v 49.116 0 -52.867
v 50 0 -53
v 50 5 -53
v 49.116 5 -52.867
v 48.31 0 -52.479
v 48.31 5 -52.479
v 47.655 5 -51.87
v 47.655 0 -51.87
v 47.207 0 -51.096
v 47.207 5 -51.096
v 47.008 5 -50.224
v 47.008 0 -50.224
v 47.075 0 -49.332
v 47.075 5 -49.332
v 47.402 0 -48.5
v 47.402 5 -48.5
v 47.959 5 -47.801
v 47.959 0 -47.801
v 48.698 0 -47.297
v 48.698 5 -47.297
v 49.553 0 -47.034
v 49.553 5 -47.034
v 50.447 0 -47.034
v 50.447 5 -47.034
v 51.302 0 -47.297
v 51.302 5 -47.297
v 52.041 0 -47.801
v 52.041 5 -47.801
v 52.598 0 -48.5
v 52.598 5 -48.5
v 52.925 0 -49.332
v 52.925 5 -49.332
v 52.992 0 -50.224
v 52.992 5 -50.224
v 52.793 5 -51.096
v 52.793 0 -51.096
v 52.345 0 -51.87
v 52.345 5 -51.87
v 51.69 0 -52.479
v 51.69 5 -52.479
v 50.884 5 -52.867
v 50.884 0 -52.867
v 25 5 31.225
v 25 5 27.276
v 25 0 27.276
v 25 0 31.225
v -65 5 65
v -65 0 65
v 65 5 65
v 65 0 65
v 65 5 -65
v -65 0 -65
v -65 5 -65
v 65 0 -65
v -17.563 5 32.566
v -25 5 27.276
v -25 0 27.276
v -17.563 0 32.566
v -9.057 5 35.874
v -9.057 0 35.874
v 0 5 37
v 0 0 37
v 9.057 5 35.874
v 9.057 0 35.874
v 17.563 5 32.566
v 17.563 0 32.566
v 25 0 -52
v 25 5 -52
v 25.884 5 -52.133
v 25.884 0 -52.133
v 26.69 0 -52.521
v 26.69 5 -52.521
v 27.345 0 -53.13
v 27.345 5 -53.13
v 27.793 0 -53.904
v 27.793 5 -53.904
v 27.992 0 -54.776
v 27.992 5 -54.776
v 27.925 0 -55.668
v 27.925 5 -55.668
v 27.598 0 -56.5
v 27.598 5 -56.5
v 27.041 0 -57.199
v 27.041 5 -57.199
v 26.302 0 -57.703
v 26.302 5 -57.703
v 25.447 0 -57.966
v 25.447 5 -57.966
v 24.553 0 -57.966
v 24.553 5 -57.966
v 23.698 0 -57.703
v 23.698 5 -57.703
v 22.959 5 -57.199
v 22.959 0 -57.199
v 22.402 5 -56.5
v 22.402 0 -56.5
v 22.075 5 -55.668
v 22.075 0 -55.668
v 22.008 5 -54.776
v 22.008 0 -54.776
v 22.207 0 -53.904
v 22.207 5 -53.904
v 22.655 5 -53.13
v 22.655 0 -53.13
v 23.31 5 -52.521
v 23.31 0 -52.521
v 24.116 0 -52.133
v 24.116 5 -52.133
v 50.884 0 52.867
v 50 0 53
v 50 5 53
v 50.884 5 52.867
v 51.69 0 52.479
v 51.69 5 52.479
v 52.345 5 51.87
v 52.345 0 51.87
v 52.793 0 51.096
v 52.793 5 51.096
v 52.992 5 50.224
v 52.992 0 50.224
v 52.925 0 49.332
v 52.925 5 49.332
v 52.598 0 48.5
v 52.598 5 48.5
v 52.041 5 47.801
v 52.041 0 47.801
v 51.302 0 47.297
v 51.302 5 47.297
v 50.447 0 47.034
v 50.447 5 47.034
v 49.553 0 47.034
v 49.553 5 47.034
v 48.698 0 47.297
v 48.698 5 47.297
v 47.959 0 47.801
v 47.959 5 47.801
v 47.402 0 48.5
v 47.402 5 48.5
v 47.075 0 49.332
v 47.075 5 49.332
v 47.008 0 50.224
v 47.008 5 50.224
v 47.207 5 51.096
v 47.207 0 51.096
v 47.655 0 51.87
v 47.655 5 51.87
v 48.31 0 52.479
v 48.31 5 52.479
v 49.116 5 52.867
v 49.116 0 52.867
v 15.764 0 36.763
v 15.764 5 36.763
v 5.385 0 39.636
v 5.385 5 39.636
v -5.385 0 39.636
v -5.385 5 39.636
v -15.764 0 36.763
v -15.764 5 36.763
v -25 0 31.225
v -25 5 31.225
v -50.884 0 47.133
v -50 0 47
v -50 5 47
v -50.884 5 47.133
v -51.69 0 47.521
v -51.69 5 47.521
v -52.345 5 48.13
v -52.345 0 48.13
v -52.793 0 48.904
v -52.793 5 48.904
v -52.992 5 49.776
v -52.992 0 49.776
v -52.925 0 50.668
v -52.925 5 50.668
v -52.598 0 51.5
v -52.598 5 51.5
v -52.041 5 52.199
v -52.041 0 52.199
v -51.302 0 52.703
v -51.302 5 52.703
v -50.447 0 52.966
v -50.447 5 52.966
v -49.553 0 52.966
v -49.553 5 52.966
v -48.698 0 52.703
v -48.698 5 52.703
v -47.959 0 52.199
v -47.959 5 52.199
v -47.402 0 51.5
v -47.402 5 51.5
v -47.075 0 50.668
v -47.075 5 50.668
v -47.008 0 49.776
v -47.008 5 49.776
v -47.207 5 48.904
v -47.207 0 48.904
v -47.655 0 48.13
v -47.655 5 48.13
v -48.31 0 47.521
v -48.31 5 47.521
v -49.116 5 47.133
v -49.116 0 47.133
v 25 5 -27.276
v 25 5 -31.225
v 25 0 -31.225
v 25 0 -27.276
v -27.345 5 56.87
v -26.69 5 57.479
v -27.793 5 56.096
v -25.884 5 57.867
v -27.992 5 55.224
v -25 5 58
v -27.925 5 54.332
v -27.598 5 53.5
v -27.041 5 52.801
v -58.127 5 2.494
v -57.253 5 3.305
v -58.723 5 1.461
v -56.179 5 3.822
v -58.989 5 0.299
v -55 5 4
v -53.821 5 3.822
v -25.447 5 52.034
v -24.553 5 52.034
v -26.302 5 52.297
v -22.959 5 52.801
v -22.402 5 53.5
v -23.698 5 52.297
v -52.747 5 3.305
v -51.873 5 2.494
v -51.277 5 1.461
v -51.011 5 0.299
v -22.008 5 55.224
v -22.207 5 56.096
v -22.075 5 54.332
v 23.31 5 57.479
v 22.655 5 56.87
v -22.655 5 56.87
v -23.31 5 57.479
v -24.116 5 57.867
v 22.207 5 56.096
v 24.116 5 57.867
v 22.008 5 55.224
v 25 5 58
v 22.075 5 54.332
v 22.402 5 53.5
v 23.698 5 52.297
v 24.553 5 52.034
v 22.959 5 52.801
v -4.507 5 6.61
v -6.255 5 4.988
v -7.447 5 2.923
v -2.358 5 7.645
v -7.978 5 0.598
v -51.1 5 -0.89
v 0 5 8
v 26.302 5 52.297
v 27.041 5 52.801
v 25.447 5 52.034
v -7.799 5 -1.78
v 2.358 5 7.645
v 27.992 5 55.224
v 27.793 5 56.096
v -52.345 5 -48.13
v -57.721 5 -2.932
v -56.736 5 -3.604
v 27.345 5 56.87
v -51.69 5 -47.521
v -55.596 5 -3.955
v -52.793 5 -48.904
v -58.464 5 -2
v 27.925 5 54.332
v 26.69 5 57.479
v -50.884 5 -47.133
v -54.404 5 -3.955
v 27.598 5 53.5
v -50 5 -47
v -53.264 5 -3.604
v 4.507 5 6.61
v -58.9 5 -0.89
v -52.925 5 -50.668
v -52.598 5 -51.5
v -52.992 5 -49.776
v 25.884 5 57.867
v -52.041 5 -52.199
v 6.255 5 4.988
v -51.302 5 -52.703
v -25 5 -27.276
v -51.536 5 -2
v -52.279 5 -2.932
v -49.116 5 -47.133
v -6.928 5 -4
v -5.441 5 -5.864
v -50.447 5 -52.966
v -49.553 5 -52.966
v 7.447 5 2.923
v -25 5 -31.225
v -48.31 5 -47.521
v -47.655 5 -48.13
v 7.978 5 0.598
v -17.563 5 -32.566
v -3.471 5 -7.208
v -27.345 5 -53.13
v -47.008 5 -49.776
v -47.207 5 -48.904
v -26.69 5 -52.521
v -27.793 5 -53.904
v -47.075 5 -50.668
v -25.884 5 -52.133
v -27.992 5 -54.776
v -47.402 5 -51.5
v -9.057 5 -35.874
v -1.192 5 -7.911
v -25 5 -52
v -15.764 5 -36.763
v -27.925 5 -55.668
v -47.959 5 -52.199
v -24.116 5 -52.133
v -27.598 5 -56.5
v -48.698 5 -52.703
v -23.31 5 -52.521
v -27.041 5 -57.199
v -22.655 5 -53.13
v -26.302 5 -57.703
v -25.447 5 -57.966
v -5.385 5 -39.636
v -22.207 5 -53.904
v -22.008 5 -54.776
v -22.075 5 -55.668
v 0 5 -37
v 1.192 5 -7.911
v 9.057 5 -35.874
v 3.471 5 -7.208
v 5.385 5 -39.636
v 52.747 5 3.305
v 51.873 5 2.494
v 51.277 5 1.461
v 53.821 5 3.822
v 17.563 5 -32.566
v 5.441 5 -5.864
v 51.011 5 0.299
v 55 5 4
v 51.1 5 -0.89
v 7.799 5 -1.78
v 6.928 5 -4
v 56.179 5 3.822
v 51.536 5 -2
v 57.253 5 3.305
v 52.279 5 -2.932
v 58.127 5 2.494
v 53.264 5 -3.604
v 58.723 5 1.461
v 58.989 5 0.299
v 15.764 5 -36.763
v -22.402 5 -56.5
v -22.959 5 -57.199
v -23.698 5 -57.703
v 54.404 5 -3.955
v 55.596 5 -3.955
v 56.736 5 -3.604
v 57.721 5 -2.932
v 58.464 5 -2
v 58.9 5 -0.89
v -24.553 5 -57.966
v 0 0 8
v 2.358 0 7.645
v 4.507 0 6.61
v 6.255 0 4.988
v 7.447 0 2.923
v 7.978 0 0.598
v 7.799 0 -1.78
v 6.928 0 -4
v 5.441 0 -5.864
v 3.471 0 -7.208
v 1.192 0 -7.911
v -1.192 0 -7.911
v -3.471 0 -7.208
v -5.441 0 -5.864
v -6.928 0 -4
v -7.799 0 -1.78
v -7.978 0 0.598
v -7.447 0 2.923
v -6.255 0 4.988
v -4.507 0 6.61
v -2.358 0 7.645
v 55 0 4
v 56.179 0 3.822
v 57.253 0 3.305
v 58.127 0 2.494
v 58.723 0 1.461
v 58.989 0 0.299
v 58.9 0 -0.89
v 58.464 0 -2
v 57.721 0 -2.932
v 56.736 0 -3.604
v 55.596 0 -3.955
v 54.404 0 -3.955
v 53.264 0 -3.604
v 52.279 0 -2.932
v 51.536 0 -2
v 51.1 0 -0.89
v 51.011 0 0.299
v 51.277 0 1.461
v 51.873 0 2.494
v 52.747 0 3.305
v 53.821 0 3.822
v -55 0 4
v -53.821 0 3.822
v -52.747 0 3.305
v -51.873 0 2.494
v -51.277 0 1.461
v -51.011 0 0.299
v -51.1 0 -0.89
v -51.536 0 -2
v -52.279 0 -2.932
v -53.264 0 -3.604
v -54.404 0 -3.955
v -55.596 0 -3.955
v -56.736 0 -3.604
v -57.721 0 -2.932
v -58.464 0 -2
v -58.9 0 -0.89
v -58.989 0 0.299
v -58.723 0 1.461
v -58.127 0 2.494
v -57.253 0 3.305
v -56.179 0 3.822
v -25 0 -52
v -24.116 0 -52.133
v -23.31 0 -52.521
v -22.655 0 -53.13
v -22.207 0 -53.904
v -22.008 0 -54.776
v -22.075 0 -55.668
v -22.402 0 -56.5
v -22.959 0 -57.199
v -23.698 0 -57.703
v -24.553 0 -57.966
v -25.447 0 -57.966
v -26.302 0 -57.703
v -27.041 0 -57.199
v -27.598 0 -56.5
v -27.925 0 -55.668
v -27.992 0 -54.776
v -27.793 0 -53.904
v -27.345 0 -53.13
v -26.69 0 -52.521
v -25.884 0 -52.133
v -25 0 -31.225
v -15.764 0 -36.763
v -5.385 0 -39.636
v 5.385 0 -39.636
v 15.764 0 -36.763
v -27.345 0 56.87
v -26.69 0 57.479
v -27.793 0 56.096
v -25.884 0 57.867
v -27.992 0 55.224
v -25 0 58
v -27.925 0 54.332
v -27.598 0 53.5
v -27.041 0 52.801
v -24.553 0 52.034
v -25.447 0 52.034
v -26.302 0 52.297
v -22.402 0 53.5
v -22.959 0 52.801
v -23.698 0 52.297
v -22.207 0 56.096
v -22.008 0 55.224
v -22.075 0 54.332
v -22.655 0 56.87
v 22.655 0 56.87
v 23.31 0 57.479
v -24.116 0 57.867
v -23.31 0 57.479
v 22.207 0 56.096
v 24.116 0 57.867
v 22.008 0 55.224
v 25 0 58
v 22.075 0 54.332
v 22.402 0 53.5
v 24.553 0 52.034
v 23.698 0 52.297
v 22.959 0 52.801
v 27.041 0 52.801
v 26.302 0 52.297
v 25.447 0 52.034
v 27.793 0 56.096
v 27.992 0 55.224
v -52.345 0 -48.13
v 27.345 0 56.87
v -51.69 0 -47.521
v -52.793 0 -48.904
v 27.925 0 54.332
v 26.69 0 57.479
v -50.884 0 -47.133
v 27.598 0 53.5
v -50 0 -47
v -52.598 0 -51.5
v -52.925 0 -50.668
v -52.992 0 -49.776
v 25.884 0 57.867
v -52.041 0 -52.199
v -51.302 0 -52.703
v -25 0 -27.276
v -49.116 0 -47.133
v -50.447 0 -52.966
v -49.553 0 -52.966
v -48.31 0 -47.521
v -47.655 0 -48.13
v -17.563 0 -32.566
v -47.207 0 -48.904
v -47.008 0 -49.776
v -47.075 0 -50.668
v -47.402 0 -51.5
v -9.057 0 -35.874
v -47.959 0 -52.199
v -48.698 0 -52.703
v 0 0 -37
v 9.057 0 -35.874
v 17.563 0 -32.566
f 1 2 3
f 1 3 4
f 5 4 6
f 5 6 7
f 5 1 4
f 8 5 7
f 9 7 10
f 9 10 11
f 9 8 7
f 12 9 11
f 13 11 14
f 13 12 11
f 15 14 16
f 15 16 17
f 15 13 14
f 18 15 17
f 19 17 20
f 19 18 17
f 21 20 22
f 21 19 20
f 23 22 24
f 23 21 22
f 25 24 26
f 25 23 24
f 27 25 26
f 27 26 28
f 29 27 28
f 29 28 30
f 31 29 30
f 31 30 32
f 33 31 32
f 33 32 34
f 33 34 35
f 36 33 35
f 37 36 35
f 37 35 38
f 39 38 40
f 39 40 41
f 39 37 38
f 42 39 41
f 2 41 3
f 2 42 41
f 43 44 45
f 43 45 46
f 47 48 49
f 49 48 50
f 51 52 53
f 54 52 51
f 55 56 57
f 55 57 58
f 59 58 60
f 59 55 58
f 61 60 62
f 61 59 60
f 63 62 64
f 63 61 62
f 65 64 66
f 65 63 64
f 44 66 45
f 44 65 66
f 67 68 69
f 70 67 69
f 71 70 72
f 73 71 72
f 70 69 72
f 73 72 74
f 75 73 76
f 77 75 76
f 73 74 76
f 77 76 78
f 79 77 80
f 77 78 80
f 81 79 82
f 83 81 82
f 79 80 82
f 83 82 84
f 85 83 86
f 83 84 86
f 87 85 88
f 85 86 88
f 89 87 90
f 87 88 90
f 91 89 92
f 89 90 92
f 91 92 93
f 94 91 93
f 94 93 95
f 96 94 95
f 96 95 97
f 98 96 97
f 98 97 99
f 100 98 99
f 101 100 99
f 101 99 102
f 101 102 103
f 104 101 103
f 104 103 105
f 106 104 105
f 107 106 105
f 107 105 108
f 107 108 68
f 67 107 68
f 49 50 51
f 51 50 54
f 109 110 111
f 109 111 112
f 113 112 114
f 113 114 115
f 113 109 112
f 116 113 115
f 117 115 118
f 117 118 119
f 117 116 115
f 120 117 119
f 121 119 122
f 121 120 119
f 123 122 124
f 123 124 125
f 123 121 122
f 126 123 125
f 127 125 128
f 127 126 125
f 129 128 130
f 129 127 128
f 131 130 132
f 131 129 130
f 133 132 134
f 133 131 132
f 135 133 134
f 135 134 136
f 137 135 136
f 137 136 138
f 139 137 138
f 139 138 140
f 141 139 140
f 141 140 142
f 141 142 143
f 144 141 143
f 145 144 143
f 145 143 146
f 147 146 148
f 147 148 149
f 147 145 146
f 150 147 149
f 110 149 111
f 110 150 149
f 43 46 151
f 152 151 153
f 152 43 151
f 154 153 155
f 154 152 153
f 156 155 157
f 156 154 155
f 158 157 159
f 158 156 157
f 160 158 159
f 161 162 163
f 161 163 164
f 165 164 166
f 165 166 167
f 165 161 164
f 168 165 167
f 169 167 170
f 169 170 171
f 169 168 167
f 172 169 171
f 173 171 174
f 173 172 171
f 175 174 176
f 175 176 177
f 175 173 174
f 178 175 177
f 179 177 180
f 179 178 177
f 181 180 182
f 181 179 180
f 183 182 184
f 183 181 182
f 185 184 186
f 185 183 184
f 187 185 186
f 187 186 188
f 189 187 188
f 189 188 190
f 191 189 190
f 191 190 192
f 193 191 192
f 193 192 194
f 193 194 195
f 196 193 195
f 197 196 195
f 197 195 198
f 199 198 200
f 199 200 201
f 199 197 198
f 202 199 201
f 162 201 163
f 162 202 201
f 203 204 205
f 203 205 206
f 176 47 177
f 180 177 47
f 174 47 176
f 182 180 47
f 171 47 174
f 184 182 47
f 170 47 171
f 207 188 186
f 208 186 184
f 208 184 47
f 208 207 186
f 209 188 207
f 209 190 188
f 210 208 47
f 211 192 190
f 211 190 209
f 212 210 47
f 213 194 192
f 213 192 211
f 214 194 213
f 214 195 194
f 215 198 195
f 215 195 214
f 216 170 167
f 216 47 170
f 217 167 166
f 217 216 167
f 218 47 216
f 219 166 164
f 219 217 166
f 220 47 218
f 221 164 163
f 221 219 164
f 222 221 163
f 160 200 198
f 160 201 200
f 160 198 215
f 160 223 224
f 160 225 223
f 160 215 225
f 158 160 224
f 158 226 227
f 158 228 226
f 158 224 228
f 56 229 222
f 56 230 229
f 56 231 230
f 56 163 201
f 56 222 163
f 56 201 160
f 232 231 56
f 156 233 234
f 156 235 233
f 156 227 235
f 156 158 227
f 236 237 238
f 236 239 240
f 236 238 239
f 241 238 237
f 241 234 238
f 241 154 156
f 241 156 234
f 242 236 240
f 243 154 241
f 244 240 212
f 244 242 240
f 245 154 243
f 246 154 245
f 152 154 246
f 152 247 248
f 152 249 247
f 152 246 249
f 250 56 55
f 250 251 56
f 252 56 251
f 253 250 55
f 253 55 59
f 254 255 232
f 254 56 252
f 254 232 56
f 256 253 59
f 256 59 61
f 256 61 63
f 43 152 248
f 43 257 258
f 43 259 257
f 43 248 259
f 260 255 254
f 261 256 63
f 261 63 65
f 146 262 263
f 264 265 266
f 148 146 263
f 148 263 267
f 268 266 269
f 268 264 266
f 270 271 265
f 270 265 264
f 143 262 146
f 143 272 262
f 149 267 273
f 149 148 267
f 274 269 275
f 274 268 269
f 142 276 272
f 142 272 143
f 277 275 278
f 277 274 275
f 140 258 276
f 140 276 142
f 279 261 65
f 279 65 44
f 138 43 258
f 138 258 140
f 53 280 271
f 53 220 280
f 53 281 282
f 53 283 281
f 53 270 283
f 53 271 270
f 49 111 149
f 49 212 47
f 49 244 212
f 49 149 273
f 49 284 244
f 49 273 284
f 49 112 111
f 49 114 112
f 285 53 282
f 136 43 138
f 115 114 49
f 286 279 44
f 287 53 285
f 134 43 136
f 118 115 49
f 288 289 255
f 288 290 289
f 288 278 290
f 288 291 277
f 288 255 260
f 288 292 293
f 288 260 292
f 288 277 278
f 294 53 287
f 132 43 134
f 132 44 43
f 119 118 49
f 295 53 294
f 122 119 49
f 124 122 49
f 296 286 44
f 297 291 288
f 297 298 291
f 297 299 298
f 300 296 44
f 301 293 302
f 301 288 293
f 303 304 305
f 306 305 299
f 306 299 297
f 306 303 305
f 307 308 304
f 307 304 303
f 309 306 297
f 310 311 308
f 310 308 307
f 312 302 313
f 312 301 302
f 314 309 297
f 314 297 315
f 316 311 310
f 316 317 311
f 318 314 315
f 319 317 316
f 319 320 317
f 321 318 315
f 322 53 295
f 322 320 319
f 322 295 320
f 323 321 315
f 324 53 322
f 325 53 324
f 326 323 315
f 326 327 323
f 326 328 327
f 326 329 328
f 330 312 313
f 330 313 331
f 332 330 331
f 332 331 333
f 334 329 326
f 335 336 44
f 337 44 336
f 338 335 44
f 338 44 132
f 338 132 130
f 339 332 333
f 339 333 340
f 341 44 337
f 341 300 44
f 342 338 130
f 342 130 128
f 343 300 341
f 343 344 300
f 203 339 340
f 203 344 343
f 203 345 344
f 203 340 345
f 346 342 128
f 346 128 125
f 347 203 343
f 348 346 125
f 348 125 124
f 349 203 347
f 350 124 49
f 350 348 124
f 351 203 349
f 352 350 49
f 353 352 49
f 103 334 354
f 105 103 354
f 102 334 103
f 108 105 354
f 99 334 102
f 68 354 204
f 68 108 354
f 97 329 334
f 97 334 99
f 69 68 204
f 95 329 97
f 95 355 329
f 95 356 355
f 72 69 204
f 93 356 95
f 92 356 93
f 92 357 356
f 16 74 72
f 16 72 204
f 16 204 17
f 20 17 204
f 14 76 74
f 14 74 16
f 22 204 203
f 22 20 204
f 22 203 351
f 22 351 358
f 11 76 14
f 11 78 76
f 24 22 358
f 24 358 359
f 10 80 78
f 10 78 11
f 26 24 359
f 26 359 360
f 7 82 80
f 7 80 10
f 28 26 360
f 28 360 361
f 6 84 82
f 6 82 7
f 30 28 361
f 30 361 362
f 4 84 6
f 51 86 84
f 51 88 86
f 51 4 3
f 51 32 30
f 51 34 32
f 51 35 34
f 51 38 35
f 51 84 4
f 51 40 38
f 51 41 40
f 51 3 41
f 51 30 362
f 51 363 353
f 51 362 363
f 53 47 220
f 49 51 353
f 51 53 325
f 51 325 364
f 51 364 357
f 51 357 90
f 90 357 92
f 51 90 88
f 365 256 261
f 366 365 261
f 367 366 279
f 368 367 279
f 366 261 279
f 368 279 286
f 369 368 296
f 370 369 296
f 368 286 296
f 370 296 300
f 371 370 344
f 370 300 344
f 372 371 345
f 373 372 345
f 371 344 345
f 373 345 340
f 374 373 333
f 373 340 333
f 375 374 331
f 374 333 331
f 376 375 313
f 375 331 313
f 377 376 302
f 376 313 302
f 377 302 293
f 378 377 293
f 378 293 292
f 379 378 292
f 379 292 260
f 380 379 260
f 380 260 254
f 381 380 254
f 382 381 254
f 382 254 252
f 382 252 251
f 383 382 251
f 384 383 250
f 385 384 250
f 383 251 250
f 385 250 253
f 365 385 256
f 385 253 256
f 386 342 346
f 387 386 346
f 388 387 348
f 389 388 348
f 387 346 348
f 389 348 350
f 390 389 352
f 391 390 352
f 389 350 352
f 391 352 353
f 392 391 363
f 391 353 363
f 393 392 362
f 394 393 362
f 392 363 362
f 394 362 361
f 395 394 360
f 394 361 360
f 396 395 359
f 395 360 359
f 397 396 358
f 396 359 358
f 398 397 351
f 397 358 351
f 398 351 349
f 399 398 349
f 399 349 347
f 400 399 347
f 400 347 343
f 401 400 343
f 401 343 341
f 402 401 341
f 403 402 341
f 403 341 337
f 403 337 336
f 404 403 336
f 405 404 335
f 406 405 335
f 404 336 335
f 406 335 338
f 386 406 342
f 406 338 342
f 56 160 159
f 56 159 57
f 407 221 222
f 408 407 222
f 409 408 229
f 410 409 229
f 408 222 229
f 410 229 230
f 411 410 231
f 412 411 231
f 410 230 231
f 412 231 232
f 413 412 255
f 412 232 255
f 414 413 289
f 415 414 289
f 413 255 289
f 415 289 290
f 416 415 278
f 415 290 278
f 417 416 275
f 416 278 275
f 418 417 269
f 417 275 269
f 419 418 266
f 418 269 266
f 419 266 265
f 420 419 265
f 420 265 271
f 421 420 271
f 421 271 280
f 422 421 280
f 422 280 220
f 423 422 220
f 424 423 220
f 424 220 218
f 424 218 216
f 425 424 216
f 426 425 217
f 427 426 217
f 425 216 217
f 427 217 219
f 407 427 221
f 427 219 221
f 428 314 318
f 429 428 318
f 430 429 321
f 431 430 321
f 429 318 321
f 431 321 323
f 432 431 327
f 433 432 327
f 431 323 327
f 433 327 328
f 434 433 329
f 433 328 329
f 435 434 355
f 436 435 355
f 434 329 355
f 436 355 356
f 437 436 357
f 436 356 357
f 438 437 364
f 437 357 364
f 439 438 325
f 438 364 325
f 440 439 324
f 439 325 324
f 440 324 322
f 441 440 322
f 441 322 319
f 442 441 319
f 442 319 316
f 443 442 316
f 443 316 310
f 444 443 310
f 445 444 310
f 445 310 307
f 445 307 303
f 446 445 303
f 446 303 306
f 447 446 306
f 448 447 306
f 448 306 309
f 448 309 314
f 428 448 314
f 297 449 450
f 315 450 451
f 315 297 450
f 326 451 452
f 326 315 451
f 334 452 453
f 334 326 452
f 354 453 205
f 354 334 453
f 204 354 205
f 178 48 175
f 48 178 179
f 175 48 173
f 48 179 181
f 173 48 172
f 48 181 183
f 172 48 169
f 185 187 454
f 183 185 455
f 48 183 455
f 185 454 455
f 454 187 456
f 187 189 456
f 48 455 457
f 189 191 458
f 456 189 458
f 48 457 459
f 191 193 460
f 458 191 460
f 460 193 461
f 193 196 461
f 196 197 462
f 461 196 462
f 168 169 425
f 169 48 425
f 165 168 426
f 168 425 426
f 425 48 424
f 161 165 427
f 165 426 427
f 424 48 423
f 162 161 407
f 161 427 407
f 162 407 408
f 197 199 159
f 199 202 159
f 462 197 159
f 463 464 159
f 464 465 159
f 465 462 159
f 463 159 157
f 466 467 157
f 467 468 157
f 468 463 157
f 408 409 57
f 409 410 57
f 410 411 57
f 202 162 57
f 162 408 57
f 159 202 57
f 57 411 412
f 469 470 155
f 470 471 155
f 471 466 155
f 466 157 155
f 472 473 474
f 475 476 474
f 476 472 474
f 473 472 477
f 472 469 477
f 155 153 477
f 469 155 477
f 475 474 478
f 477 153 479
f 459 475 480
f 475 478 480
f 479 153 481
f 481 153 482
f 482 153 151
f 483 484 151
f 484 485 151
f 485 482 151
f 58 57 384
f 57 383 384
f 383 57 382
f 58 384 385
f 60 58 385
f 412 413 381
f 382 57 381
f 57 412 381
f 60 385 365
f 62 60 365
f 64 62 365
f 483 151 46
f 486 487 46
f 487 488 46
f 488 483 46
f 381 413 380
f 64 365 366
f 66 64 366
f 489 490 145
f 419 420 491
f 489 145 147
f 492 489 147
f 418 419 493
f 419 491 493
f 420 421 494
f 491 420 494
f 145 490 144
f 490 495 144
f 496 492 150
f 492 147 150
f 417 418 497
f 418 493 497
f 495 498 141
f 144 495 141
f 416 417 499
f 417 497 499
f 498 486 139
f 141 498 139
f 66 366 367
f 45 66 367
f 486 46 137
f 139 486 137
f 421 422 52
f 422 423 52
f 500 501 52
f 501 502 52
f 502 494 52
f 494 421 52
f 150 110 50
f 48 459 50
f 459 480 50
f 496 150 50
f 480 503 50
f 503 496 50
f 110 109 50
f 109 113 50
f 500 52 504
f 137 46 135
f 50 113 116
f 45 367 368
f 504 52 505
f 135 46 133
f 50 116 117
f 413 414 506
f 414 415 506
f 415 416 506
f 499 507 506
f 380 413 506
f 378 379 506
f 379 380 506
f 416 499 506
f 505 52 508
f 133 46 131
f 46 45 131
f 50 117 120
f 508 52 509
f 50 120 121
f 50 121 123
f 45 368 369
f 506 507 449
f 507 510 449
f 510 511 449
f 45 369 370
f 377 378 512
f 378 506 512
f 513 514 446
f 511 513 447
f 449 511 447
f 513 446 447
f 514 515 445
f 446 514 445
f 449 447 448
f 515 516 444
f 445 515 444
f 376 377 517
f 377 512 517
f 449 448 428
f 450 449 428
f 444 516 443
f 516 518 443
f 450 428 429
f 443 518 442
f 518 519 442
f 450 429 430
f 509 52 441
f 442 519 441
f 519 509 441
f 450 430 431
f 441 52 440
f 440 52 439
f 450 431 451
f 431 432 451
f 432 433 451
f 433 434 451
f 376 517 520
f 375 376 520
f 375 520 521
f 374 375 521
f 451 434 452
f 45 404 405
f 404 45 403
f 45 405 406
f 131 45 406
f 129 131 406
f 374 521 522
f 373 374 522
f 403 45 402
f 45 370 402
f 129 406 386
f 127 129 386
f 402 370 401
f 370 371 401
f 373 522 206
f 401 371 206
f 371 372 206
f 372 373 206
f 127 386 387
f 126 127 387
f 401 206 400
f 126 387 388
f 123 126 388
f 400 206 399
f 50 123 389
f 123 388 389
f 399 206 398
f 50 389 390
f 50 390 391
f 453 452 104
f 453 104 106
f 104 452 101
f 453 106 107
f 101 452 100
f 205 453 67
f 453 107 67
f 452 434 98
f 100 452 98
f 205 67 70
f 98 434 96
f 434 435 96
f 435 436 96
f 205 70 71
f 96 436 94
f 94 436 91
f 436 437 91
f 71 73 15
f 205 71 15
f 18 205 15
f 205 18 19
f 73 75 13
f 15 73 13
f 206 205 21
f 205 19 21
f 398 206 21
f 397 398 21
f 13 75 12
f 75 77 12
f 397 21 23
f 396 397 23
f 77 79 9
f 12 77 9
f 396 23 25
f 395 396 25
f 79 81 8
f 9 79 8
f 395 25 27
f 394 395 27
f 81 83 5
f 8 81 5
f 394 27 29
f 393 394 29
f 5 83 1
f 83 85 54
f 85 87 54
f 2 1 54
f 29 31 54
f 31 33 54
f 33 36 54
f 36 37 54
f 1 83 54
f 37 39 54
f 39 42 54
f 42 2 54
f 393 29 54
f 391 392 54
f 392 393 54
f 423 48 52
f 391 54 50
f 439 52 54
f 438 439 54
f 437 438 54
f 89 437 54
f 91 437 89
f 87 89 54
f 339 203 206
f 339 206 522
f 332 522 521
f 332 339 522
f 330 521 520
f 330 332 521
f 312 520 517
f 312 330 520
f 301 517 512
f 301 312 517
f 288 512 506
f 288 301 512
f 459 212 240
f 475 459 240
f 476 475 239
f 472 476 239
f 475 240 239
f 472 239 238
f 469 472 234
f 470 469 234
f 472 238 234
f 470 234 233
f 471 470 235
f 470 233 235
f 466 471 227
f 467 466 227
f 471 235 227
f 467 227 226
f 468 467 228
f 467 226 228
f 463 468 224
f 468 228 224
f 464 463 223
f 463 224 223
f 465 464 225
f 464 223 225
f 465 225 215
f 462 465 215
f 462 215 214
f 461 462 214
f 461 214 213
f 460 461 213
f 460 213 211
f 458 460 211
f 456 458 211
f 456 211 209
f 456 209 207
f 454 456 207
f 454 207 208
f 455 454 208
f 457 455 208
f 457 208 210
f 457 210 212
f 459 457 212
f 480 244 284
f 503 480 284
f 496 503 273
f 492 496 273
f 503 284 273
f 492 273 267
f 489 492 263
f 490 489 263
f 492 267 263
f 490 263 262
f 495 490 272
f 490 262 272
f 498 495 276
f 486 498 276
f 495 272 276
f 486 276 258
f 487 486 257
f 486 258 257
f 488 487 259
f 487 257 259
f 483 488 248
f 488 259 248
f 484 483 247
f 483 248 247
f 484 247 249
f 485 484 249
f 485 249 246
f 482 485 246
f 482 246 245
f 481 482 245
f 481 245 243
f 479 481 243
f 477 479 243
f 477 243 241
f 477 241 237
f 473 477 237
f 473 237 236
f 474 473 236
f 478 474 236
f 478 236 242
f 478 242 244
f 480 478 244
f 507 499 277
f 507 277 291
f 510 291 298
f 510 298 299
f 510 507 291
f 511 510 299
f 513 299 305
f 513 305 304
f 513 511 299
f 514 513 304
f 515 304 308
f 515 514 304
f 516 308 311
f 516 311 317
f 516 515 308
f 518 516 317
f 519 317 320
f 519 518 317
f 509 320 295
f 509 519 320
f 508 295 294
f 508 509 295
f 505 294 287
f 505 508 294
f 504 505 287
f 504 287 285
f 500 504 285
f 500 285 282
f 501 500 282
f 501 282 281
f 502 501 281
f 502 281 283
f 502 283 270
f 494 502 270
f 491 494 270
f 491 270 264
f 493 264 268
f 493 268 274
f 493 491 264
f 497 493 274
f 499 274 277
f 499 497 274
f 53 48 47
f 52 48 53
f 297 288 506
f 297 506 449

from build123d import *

# Parameters (mm, degrees)
SKETCH1_W           = 130
SKETCH1_H           = 130
SKETCH1_R           = 3
BOSS_EXTRUDE1_DEPTH = 5
SKETCH2_R           = 8
CUT_EXTRUDE1_DEPTH  = 5
SKETCH3_R           = 4
CUT_EXTRUDE2_DEPTH  = 5
SKETCH4_R           = 3
CUT_EXTRUDE3_DEPTH  = 10
CUT_EXTRUDE4_DEPTH  = 10


with BuildPart() as part:
    # Sketch1 → Boss-Extrude1 (new body)
    with BuildSketch(Plane(origin=(0, 0, 0), x_dir=(1, 0, 0), z_dir=(0, 1, 0))):
        Rectangle(SKETCH1_W, SKETCH1_H)
        with Locations(Location((-50, 50, 0), (0, 0, 270))):
            Circle(SKETCH1_R, mode=Mode.SUBTRACT)
        with Locations(Location((50, 50, 0), (0, 0, 90))):
            Circle(SKETCH1_R, mode=Mode.SUBTRACT)
        with Locations(Location((50, -50, 0), (0, 0, 270))):
            Circle(SKETCH1_R, mode=Mode.SUBTRACT)
        with Locations(Location((-50, -50, 0), (0, 0, 90))):
            Circle(SKETCH1_R, mode=Mode.SUBTRACT)
    extrude(amount=BOSS_EXTRUDE1_DEPTH)

    # Sketch2 → Cut-Extrude1 (cut)
    with BuildSketch(Plane(origin=(0, 5, 0), x_dir=(1, 0, 0), z_dir=(0, 1, 0))):
        with Locations(Location((0, 0, 0), (0, 0, 270))):
            Circle(SKETCH2_R)
    extrude(amount=-CUT_EXTRUDE1_DEPTH, mode=Mode.SUBTRACT)

    # Sketch3 → Cut-Extrude2 (cut)
    with BuildSketch(Plane(origin=(0, 5, 0), x_dir=(1, 0, 0), z_dir=(0, 1, 0))):
        with Locations(Location((-55, 0, 0), (0, 0, 270))):
            Circle(SKETCH3_R)
        with Locations(Location((55, 0, 0), (0, 0, 270))):
            Circle(SKETCH3_R)
    extrude(amount=-CUT_EXTRUDE2_DEPTH, mode=Mode.SUBTRACT)

    # Sketch4 → Cut-Extrude3 (cut)
    with BuildSketch(Plane(origin=(0, 5, 0), x_dir=(1, 0, 0), z_dir=(0, 1, 0))):
        with Locations(Location((-25, 55, 0), (0, 0, 270))):
            Circle(SKETCH4_R)
        with Locations(Location((25, 55, 0), (0, 0, 270))):
            Circle(SKETCH4_R)
        with Locations(Location((-25, -55, 0), (0, 0, 270))):
            Circle(SKETCH4_R)
        with Locations(Location((25, -55, 0), (0, 0, 270))):
            Circle(SKETCH4_R)
    extrude(amount=-CUT_EXTRUDE3_DEPTH, mode=Mode.SUBTRACT)

    # Sketch5 → Cut-Extrude4 (cut)
    with BuildSketch(Plane(origin=(0, 5, 0), x_dir=(1, 0, 0), z_dir=(0, 1, 0))):
        with BuildLine():
            Line((25, 31.224989992), (25, 27.276363394))
            ThreePointArc((25, 27.276363394), (0, 37), (-25, 27.276363394))
            Line((-25, 27.276363394), (-25, 31.224989992))
            ThreePointArc((-25, 31.224989992), (0, 40), (25, 31.224989992))
        make_face()
        with BuildLine():
            Line((25, -27.276363394), (25, -31.224989992))
            ThreePointArc((25, -31.224989992), (0, -40), (-25, -31.224989992))
            Line((-25, -31.224989992), (-25, -27.276363394))
            ThreePointArc((-25, -27.276363394), (0, -37), (25, -27.276363394))
        make_face()
    extrude(amount=-CUT_EXTRUDE4_DEPTH, mode=Mode.SUBTRACT)


solid = part.part
